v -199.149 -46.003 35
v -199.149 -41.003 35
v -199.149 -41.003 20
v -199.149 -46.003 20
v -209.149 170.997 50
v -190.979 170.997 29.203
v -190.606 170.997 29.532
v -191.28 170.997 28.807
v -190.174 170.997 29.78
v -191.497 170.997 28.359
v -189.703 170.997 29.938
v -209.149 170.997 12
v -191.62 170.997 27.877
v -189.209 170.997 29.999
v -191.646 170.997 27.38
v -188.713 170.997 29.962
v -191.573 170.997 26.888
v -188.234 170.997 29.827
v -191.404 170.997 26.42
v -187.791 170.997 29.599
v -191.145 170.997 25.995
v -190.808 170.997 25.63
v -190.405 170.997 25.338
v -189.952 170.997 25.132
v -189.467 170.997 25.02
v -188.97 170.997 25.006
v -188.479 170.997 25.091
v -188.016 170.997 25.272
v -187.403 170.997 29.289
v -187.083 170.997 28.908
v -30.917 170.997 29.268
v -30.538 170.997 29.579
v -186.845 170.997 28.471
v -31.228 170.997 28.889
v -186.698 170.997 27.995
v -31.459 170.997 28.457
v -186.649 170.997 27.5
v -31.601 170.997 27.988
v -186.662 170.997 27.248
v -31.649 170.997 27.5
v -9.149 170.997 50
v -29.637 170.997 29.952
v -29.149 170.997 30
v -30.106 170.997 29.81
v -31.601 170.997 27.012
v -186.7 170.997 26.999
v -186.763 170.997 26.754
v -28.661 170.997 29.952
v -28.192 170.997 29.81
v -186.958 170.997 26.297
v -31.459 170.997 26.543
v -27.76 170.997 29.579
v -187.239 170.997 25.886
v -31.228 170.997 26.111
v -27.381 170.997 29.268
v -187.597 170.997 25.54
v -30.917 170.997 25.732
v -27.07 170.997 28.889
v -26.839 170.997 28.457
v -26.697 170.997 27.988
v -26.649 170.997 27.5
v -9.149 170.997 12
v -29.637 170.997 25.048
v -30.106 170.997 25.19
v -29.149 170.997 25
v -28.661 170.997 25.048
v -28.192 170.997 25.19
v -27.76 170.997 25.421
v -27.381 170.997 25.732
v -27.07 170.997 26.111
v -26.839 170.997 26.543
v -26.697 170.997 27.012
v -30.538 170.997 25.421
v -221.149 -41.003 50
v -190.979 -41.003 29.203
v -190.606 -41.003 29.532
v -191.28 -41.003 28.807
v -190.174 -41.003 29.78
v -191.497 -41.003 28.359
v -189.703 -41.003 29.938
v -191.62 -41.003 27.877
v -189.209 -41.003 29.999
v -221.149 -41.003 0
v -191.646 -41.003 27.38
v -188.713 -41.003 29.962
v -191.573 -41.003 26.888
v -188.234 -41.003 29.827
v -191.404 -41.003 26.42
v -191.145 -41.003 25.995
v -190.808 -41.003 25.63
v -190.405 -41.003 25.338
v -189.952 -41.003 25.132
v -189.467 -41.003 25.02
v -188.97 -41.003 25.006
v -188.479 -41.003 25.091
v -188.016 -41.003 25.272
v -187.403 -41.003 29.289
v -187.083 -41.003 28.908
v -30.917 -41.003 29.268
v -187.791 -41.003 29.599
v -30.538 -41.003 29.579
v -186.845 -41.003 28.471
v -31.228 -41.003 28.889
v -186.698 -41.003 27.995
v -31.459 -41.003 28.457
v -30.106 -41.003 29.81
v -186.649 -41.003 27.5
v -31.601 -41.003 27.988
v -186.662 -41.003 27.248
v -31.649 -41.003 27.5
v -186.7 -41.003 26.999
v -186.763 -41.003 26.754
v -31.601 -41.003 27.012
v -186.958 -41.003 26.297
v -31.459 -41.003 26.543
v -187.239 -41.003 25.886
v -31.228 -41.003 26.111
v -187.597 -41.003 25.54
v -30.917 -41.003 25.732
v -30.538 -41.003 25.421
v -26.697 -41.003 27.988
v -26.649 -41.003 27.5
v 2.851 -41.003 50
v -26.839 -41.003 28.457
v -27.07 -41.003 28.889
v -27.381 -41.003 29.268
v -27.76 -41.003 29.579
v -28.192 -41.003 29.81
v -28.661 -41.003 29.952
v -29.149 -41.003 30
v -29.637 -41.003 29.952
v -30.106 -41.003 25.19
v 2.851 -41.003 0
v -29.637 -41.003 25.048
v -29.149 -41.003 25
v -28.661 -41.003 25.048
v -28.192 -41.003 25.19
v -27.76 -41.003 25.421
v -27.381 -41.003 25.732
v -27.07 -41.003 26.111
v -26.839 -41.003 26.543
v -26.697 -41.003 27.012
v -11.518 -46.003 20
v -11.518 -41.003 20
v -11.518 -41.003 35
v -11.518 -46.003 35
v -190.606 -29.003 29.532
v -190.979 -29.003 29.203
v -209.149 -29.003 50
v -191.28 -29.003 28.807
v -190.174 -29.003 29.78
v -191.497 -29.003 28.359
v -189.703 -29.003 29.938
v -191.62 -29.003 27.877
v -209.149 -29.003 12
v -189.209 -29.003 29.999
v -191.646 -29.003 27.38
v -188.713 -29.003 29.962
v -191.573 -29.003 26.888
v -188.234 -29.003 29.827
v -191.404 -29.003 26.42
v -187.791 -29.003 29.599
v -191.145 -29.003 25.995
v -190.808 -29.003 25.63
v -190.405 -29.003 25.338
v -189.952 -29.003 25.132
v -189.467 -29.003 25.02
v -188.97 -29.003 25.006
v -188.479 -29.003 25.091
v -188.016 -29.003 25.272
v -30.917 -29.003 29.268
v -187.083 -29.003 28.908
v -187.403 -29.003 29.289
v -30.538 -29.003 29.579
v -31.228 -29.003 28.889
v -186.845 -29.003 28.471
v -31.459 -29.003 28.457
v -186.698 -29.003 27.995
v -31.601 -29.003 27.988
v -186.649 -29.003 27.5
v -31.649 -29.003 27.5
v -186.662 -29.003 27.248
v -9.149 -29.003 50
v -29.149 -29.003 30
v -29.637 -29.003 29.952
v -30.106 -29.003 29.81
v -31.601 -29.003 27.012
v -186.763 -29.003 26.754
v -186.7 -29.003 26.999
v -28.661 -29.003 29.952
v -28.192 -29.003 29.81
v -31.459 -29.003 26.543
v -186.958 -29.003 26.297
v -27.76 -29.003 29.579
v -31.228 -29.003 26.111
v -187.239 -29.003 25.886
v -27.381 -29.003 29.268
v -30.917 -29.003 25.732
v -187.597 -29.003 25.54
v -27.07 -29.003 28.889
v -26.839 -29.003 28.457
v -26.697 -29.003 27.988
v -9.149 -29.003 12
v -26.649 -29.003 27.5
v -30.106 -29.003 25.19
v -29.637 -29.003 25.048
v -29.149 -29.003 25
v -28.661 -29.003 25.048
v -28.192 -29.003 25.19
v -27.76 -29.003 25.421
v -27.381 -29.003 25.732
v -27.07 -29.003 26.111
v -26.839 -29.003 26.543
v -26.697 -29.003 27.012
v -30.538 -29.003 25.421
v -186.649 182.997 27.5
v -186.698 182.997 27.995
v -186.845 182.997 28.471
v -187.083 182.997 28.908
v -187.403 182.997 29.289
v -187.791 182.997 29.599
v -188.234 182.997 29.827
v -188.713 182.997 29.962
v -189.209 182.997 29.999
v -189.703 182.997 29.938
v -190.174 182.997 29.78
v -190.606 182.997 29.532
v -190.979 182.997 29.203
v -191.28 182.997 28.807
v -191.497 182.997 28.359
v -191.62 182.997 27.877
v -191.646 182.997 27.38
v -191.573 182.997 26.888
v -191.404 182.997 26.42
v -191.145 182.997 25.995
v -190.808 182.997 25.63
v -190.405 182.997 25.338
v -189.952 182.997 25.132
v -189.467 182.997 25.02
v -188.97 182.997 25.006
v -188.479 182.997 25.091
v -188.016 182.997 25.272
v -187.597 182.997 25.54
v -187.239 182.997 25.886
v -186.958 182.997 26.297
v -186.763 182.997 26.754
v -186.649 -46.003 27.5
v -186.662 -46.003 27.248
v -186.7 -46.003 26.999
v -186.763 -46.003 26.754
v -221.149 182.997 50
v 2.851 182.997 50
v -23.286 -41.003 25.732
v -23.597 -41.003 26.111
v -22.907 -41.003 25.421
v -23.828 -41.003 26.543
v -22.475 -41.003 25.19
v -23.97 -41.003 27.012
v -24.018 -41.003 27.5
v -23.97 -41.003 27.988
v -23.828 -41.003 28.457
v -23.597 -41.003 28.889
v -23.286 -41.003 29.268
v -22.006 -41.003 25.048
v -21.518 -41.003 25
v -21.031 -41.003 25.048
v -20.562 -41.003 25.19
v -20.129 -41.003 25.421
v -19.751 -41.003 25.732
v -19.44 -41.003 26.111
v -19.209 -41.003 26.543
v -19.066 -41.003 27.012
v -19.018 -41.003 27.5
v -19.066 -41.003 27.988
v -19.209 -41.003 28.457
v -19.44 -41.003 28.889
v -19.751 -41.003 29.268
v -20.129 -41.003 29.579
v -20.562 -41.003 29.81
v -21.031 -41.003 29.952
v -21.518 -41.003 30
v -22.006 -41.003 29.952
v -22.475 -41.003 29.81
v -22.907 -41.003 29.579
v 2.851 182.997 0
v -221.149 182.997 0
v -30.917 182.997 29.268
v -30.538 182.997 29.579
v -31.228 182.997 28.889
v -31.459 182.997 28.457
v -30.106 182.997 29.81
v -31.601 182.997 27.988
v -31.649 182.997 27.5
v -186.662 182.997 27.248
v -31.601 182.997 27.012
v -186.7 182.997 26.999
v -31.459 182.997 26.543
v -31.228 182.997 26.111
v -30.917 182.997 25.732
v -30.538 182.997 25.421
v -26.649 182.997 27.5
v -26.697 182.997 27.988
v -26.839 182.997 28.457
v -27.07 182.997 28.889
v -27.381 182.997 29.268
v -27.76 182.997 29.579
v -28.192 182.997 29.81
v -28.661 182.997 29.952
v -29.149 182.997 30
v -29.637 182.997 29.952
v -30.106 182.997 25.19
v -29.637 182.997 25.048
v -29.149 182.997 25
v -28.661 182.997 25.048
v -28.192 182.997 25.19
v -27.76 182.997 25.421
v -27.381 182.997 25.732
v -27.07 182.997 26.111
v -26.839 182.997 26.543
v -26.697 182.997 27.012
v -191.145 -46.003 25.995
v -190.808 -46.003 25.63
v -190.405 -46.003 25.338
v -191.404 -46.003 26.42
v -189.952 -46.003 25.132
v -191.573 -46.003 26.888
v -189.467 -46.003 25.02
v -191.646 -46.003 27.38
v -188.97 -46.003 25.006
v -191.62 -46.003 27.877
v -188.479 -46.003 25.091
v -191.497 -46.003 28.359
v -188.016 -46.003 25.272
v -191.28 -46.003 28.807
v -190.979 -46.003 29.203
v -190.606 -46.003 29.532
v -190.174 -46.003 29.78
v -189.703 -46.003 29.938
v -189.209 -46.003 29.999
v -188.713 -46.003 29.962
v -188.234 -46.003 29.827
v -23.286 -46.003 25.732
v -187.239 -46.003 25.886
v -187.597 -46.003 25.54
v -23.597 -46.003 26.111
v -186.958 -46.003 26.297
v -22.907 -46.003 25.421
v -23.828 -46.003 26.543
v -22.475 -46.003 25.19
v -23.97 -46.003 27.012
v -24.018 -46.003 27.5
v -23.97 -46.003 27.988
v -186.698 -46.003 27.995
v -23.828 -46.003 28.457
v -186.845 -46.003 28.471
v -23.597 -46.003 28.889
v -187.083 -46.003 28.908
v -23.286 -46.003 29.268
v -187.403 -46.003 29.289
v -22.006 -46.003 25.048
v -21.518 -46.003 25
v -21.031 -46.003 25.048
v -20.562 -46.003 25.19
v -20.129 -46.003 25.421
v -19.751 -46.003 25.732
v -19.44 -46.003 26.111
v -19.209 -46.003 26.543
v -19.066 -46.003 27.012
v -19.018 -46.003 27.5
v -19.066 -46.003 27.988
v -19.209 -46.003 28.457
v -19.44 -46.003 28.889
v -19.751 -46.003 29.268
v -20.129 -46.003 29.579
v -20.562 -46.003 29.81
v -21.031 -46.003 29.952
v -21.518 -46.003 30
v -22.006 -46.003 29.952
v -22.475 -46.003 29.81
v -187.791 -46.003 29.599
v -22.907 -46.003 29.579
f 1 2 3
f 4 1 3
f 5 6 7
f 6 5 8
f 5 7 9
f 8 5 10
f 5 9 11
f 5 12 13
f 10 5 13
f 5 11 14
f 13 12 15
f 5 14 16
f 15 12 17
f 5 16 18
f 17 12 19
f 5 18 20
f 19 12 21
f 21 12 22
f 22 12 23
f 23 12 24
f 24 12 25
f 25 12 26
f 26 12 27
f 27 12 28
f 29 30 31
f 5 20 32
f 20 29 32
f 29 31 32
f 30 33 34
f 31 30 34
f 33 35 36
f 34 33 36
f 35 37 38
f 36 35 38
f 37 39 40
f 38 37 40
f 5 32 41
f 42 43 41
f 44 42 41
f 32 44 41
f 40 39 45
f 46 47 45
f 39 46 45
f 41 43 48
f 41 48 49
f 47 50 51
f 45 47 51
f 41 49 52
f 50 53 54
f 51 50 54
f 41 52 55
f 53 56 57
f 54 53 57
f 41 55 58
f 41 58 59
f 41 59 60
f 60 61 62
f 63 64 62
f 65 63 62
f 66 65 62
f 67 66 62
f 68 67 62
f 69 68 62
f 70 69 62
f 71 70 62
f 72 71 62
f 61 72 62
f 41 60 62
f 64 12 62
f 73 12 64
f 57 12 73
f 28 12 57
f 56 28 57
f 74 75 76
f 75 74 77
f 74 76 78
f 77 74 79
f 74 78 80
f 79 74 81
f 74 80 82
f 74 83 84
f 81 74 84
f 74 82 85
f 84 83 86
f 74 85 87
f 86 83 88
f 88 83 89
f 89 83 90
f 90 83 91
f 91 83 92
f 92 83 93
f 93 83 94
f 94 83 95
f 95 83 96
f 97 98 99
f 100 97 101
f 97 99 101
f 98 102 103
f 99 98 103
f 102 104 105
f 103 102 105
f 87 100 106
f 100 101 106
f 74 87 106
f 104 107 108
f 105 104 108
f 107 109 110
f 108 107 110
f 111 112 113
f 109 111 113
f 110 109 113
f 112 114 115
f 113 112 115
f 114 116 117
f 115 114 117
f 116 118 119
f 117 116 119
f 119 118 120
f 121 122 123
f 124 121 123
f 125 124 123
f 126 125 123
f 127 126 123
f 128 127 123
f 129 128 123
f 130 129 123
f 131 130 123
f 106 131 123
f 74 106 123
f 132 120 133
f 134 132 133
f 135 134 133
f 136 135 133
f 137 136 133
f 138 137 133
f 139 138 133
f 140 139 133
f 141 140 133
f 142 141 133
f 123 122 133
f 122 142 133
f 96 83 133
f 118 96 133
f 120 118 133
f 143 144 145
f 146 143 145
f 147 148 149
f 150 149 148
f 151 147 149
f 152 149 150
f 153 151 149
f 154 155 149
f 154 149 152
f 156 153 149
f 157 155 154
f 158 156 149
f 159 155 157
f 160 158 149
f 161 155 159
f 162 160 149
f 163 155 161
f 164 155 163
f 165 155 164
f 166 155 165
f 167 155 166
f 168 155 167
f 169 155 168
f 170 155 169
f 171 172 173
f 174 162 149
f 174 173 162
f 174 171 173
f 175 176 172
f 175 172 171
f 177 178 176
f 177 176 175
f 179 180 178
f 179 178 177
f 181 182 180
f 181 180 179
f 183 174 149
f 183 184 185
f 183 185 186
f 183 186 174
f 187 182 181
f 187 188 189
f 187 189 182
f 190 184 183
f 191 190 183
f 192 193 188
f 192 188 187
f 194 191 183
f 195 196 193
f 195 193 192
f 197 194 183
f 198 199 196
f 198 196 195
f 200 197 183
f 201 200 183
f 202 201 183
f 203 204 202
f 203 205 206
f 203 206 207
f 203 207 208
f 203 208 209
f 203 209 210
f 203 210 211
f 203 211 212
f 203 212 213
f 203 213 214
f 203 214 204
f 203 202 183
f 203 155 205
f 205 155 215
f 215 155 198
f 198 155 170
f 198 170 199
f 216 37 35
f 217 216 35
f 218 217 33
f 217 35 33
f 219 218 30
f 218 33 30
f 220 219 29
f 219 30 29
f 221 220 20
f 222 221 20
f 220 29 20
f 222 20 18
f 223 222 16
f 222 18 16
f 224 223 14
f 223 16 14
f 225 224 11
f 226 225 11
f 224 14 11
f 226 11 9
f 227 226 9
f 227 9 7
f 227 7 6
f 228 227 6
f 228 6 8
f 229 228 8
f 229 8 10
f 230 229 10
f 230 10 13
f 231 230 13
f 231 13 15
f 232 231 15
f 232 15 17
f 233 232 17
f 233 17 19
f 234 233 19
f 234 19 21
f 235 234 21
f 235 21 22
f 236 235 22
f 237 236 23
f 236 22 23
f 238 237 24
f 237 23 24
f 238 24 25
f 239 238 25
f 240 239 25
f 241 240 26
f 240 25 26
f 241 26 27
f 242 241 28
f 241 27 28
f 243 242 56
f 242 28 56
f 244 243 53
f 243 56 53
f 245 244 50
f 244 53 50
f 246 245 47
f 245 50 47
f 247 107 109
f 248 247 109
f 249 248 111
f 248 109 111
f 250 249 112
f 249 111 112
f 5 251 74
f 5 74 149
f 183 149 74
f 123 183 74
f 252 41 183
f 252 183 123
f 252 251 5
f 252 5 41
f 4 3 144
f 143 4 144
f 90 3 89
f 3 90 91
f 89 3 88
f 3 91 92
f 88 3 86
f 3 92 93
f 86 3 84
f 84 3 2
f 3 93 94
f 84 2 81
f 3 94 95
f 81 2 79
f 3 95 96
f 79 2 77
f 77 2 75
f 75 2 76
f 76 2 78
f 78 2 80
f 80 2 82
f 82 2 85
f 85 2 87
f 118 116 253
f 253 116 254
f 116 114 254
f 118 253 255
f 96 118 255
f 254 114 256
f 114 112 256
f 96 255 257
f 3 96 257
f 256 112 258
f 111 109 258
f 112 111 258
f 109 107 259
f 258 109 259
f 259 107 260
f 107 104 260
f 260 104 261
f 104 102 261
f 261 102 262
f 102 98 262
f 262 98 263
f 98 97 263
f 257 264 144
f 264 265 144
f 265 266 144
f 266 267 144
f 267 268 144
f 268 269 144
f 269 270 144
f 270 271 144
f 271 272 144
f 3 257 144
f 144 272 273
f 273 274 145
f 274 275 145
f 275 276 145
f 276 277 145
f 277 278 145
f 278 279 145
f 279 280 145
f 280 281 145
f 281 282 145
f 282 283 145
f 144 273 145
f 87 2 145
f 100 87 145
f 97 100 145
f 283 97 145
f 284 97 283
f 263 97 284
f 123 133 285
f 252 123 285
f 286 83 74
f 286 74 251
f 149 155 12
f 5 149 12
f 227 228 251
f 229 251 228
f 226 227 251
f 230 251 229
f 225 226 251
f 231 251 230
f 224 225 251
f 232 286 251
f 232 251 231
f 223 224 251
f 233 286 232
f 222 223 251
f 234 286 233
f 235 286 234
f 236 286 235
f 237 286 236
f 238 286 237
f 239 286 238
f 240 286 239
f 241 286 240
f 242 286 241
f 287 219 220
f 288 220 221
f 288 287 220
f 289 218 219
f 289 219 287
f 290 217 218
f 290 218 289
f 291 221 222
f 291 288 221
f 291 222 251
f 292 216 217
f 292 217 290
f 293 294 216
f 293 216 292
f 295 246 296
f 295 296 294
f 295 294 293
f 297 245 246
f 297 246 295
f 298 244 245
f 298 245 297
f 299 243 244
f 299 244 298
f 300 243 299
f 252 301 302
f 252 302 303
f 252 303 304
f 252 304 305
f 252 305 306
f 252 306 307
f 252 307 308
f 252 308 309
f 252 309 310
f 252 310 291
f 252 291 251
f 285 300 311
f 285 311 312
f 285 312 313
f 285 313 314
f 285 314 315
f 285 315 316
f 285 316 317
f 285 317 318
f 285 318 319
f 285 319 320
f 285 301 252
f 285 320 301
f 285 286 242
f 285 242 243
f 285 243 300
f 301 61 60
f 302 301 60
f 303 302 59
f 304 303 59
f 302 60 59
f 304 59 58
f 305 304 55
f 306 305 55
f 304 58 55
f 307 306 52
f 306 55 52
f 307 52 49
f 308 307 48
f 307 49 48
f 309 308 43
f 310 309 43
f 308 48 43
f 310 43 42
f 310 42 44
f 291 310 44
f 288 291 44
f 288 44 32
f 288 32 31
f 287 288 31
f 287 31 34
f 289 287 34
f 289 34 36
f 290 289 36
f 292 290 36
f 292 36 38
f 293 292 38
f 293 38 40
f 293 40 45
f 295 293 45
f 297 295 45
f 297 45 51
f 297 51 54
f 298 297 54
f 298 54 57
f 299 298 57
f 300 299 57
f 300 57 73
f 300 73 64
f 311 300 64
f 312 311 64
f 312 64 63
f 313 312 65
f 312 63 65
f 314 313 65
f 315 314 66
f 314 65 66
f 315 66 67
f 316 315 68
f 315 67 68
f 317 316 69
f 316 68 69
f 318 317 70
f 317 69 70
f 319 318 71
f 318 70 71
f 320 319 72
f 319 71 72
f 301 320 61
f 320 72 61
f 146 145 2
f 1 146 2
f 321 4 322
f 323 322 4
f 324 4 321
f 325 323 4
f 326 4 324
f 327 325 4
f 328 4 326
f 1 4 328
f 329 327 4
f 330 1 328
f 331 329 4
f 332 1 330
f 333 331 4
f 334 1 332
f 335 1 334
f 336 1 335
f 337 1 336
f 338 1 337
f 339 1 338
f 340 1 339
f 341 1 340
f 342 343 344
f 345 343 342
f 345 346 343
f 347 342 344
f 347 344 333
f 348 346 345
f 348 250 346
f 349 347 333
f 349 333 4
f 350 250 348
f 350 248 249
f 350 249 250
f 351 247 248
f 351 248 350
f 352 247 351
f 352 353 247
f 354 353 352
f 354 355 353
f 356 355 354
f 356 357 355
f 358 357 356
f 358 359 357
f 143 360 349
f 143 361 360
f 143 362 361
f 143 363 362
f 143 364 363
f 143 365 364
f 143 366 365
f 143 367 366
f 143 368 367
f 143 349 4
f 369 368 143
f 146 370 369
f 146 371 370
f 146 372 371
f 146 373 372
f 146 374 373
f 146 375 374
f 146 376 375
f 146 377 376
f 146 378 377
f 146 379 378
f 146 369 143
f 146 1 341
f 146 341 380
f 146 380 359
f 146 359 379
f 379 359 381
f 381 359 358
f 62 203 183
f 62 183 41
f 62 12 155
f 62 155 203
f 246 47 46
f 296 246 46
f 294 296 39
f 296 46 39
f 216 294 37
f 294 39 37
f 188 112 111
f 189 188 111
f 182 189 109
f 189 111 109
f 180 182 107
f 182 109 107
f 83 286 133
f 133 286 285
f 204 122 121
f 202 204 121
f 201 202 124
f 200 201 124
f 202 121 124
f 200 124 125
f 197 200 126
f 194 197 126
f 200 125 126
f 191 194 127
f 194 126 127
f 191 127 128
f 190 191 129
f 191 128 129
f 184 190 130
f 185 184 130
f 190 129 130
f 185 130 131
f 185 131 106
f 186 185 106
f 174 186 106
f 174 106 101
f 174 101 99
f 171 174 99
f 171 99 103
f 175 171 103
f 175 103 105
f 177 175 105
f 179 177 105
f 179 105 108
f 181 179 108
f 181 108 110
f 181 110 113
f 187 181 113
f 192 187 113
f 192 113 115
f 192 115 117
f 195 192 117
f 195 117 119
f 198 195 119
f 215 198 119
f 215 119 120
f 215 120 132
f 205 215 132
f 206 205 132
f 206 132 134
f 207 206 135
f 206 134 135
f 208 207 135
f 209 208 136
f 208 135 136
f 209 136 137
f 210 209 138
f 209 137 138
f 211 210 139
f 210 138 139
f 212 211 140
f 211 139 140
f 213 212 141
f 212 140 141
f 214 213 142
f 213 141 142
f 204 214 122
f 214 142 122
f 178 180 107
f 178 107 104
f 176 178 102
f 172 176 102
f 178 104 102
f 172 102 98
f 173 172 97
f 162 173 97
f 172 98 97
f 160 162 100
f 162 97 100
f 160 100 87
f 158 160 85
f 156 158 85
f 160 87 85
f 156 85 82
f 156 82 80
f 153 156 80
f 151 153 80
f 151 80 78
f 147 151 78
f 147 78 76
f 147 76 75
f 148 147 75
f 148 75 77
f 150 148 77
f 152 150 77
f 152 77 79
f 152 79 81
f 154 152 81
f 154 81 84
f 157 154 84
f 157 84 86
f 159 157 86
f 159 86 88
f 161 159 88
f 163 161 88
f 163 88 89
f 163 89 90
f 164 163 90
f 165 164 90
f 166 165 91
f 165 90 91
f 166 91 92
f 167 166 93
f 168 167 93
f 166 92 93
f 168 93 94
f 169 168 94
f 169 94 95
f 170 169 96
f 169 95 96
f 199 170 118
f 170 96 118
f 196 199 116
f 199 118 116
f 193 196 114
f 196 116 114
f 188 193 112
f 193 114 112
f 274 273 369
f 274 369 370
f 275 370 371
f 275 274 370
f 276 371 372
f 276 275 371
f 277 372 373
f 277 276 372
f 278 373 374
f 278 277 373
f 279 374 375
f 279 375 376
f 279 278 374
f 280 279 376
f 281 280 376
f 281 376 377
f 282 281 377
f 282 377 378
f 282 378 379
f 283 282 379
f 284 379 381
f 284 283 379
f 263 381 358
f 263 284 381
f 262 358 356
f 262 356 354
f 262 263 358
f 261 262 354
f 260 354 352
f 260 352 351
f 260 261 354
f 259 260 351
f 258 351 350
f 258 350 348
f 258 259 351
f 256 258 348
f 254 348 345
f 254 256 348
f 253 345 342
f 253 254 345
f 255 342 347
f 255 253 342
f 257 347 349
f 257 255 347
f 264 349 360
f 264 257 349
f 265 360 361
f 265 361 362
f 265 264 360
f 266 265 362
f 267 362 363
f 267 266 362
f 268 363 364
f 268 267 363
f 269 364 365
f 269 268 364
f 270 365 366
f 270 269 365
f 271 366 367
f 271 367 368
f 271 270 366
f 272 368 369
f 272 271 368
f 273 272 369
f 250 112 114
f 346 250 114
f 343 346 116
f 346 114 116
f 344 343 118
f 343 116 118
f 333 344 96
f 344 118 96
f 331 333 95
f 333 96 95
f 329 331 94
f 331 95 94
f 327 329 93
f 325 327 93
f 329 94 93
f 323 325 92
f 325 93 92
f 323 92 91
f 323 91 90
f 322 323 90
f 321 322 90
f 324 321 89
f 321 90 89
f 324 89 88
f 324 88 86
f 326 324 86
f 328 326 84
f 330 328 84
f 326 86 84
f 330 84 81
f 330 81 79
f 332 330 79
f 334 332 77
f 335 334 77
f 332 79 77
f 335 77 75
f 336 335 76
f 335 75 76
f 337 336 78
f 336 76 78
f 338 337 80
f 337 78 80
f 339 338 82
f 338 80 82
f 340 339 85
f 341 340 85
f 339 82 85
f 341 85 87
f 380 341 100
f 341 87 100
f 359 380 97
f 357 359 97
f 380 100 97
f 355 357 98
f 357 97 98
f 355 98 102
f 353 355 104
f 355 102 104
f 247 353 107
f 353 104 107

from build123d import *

# Parameters (mm, degrees)
F0_W     = 224
F0_H     = 224
F0_W_2   = 200
F0_H_2   = 200
F1_DEPTH = 50
F2_DEPTH = 12
F3_R     = 2.5
F4_DEPTH = 5
F5_DEPTH = 300


with BuildPart() as f1:
    # F0 (on Top) → F1 (new body)
    with BuildSketch(Plane.XY):
        with Locations((-109.148975, 70.997286)):
            Rectangle(F0_W, F0_H)
        with Locations((-109.148975, 70.997286)):
            Rectangle(F0_W_2, F0_H_2, mode=Mode.SUBTRACT)
    extrude(amount=F1_DEPTH)

    # F0 (on Top) → F2 (join)
    with BuildSketch(Plane.XY):
        with Locations((-109.148975, 70.997286)):
            Rectangle(F0_W_2, F0_H_2)
    extrude(amount=F2_DEPTH)

    # F3 (on face) → F5 (cut)
    with BuildSketch(Plane.XZ.offset(41.002714)):
        with Locations((-29.148975, 27.5)):
            Circle(F3_R)
        with BuildLine():
            ThreePointArc((-186.762775, 26.754313), (-186.677589, 27.122839), (-186.648975, 27.5))
            ThreePointArc((-186.648975, 27.5), (-191.620361, 27.877161), (-186.762775, 26.754313))
        make_face()
    extrude(amount=-F5_DEPTH, mode=Mode.SUBTRACT)


with BuildPart() as f4:
    # F3 (on face) → F4 (new body)
    with BuildSketch(Plane.XZ.offset(41.002714)):
        Polygon((-199.148975, 20), (-165.148975, 20), (-11.518425, 20), (-11.518425, 35), (-199.148975, 35), align=None)
        with BuildLine():
            ThreePointArc((-186.762775, 26.754313), (-191.620361, 27.877161), (-186.648975, 27.5))
            ThreePointArc((-186.648975, 27.5), (-186.677589, 27.122839), (-186.762775, 26.754313))
        make_face(mode=Mode.SUBTRACT)
        with Locations((-29.148975, 27.5)):
            Circle(F3_R, mode=Mode.SUBTRACT)
        with Locations((-21.518425, 27.5)):
            Circle(F3_R, mode=Mode.SUBTRACT)
        with Locations((-29.148975, 27.5)):
            Circle(F3_R)
    extrude(amount=F4_DEPTH)


solid = Compound([f1.part, f4.part])
